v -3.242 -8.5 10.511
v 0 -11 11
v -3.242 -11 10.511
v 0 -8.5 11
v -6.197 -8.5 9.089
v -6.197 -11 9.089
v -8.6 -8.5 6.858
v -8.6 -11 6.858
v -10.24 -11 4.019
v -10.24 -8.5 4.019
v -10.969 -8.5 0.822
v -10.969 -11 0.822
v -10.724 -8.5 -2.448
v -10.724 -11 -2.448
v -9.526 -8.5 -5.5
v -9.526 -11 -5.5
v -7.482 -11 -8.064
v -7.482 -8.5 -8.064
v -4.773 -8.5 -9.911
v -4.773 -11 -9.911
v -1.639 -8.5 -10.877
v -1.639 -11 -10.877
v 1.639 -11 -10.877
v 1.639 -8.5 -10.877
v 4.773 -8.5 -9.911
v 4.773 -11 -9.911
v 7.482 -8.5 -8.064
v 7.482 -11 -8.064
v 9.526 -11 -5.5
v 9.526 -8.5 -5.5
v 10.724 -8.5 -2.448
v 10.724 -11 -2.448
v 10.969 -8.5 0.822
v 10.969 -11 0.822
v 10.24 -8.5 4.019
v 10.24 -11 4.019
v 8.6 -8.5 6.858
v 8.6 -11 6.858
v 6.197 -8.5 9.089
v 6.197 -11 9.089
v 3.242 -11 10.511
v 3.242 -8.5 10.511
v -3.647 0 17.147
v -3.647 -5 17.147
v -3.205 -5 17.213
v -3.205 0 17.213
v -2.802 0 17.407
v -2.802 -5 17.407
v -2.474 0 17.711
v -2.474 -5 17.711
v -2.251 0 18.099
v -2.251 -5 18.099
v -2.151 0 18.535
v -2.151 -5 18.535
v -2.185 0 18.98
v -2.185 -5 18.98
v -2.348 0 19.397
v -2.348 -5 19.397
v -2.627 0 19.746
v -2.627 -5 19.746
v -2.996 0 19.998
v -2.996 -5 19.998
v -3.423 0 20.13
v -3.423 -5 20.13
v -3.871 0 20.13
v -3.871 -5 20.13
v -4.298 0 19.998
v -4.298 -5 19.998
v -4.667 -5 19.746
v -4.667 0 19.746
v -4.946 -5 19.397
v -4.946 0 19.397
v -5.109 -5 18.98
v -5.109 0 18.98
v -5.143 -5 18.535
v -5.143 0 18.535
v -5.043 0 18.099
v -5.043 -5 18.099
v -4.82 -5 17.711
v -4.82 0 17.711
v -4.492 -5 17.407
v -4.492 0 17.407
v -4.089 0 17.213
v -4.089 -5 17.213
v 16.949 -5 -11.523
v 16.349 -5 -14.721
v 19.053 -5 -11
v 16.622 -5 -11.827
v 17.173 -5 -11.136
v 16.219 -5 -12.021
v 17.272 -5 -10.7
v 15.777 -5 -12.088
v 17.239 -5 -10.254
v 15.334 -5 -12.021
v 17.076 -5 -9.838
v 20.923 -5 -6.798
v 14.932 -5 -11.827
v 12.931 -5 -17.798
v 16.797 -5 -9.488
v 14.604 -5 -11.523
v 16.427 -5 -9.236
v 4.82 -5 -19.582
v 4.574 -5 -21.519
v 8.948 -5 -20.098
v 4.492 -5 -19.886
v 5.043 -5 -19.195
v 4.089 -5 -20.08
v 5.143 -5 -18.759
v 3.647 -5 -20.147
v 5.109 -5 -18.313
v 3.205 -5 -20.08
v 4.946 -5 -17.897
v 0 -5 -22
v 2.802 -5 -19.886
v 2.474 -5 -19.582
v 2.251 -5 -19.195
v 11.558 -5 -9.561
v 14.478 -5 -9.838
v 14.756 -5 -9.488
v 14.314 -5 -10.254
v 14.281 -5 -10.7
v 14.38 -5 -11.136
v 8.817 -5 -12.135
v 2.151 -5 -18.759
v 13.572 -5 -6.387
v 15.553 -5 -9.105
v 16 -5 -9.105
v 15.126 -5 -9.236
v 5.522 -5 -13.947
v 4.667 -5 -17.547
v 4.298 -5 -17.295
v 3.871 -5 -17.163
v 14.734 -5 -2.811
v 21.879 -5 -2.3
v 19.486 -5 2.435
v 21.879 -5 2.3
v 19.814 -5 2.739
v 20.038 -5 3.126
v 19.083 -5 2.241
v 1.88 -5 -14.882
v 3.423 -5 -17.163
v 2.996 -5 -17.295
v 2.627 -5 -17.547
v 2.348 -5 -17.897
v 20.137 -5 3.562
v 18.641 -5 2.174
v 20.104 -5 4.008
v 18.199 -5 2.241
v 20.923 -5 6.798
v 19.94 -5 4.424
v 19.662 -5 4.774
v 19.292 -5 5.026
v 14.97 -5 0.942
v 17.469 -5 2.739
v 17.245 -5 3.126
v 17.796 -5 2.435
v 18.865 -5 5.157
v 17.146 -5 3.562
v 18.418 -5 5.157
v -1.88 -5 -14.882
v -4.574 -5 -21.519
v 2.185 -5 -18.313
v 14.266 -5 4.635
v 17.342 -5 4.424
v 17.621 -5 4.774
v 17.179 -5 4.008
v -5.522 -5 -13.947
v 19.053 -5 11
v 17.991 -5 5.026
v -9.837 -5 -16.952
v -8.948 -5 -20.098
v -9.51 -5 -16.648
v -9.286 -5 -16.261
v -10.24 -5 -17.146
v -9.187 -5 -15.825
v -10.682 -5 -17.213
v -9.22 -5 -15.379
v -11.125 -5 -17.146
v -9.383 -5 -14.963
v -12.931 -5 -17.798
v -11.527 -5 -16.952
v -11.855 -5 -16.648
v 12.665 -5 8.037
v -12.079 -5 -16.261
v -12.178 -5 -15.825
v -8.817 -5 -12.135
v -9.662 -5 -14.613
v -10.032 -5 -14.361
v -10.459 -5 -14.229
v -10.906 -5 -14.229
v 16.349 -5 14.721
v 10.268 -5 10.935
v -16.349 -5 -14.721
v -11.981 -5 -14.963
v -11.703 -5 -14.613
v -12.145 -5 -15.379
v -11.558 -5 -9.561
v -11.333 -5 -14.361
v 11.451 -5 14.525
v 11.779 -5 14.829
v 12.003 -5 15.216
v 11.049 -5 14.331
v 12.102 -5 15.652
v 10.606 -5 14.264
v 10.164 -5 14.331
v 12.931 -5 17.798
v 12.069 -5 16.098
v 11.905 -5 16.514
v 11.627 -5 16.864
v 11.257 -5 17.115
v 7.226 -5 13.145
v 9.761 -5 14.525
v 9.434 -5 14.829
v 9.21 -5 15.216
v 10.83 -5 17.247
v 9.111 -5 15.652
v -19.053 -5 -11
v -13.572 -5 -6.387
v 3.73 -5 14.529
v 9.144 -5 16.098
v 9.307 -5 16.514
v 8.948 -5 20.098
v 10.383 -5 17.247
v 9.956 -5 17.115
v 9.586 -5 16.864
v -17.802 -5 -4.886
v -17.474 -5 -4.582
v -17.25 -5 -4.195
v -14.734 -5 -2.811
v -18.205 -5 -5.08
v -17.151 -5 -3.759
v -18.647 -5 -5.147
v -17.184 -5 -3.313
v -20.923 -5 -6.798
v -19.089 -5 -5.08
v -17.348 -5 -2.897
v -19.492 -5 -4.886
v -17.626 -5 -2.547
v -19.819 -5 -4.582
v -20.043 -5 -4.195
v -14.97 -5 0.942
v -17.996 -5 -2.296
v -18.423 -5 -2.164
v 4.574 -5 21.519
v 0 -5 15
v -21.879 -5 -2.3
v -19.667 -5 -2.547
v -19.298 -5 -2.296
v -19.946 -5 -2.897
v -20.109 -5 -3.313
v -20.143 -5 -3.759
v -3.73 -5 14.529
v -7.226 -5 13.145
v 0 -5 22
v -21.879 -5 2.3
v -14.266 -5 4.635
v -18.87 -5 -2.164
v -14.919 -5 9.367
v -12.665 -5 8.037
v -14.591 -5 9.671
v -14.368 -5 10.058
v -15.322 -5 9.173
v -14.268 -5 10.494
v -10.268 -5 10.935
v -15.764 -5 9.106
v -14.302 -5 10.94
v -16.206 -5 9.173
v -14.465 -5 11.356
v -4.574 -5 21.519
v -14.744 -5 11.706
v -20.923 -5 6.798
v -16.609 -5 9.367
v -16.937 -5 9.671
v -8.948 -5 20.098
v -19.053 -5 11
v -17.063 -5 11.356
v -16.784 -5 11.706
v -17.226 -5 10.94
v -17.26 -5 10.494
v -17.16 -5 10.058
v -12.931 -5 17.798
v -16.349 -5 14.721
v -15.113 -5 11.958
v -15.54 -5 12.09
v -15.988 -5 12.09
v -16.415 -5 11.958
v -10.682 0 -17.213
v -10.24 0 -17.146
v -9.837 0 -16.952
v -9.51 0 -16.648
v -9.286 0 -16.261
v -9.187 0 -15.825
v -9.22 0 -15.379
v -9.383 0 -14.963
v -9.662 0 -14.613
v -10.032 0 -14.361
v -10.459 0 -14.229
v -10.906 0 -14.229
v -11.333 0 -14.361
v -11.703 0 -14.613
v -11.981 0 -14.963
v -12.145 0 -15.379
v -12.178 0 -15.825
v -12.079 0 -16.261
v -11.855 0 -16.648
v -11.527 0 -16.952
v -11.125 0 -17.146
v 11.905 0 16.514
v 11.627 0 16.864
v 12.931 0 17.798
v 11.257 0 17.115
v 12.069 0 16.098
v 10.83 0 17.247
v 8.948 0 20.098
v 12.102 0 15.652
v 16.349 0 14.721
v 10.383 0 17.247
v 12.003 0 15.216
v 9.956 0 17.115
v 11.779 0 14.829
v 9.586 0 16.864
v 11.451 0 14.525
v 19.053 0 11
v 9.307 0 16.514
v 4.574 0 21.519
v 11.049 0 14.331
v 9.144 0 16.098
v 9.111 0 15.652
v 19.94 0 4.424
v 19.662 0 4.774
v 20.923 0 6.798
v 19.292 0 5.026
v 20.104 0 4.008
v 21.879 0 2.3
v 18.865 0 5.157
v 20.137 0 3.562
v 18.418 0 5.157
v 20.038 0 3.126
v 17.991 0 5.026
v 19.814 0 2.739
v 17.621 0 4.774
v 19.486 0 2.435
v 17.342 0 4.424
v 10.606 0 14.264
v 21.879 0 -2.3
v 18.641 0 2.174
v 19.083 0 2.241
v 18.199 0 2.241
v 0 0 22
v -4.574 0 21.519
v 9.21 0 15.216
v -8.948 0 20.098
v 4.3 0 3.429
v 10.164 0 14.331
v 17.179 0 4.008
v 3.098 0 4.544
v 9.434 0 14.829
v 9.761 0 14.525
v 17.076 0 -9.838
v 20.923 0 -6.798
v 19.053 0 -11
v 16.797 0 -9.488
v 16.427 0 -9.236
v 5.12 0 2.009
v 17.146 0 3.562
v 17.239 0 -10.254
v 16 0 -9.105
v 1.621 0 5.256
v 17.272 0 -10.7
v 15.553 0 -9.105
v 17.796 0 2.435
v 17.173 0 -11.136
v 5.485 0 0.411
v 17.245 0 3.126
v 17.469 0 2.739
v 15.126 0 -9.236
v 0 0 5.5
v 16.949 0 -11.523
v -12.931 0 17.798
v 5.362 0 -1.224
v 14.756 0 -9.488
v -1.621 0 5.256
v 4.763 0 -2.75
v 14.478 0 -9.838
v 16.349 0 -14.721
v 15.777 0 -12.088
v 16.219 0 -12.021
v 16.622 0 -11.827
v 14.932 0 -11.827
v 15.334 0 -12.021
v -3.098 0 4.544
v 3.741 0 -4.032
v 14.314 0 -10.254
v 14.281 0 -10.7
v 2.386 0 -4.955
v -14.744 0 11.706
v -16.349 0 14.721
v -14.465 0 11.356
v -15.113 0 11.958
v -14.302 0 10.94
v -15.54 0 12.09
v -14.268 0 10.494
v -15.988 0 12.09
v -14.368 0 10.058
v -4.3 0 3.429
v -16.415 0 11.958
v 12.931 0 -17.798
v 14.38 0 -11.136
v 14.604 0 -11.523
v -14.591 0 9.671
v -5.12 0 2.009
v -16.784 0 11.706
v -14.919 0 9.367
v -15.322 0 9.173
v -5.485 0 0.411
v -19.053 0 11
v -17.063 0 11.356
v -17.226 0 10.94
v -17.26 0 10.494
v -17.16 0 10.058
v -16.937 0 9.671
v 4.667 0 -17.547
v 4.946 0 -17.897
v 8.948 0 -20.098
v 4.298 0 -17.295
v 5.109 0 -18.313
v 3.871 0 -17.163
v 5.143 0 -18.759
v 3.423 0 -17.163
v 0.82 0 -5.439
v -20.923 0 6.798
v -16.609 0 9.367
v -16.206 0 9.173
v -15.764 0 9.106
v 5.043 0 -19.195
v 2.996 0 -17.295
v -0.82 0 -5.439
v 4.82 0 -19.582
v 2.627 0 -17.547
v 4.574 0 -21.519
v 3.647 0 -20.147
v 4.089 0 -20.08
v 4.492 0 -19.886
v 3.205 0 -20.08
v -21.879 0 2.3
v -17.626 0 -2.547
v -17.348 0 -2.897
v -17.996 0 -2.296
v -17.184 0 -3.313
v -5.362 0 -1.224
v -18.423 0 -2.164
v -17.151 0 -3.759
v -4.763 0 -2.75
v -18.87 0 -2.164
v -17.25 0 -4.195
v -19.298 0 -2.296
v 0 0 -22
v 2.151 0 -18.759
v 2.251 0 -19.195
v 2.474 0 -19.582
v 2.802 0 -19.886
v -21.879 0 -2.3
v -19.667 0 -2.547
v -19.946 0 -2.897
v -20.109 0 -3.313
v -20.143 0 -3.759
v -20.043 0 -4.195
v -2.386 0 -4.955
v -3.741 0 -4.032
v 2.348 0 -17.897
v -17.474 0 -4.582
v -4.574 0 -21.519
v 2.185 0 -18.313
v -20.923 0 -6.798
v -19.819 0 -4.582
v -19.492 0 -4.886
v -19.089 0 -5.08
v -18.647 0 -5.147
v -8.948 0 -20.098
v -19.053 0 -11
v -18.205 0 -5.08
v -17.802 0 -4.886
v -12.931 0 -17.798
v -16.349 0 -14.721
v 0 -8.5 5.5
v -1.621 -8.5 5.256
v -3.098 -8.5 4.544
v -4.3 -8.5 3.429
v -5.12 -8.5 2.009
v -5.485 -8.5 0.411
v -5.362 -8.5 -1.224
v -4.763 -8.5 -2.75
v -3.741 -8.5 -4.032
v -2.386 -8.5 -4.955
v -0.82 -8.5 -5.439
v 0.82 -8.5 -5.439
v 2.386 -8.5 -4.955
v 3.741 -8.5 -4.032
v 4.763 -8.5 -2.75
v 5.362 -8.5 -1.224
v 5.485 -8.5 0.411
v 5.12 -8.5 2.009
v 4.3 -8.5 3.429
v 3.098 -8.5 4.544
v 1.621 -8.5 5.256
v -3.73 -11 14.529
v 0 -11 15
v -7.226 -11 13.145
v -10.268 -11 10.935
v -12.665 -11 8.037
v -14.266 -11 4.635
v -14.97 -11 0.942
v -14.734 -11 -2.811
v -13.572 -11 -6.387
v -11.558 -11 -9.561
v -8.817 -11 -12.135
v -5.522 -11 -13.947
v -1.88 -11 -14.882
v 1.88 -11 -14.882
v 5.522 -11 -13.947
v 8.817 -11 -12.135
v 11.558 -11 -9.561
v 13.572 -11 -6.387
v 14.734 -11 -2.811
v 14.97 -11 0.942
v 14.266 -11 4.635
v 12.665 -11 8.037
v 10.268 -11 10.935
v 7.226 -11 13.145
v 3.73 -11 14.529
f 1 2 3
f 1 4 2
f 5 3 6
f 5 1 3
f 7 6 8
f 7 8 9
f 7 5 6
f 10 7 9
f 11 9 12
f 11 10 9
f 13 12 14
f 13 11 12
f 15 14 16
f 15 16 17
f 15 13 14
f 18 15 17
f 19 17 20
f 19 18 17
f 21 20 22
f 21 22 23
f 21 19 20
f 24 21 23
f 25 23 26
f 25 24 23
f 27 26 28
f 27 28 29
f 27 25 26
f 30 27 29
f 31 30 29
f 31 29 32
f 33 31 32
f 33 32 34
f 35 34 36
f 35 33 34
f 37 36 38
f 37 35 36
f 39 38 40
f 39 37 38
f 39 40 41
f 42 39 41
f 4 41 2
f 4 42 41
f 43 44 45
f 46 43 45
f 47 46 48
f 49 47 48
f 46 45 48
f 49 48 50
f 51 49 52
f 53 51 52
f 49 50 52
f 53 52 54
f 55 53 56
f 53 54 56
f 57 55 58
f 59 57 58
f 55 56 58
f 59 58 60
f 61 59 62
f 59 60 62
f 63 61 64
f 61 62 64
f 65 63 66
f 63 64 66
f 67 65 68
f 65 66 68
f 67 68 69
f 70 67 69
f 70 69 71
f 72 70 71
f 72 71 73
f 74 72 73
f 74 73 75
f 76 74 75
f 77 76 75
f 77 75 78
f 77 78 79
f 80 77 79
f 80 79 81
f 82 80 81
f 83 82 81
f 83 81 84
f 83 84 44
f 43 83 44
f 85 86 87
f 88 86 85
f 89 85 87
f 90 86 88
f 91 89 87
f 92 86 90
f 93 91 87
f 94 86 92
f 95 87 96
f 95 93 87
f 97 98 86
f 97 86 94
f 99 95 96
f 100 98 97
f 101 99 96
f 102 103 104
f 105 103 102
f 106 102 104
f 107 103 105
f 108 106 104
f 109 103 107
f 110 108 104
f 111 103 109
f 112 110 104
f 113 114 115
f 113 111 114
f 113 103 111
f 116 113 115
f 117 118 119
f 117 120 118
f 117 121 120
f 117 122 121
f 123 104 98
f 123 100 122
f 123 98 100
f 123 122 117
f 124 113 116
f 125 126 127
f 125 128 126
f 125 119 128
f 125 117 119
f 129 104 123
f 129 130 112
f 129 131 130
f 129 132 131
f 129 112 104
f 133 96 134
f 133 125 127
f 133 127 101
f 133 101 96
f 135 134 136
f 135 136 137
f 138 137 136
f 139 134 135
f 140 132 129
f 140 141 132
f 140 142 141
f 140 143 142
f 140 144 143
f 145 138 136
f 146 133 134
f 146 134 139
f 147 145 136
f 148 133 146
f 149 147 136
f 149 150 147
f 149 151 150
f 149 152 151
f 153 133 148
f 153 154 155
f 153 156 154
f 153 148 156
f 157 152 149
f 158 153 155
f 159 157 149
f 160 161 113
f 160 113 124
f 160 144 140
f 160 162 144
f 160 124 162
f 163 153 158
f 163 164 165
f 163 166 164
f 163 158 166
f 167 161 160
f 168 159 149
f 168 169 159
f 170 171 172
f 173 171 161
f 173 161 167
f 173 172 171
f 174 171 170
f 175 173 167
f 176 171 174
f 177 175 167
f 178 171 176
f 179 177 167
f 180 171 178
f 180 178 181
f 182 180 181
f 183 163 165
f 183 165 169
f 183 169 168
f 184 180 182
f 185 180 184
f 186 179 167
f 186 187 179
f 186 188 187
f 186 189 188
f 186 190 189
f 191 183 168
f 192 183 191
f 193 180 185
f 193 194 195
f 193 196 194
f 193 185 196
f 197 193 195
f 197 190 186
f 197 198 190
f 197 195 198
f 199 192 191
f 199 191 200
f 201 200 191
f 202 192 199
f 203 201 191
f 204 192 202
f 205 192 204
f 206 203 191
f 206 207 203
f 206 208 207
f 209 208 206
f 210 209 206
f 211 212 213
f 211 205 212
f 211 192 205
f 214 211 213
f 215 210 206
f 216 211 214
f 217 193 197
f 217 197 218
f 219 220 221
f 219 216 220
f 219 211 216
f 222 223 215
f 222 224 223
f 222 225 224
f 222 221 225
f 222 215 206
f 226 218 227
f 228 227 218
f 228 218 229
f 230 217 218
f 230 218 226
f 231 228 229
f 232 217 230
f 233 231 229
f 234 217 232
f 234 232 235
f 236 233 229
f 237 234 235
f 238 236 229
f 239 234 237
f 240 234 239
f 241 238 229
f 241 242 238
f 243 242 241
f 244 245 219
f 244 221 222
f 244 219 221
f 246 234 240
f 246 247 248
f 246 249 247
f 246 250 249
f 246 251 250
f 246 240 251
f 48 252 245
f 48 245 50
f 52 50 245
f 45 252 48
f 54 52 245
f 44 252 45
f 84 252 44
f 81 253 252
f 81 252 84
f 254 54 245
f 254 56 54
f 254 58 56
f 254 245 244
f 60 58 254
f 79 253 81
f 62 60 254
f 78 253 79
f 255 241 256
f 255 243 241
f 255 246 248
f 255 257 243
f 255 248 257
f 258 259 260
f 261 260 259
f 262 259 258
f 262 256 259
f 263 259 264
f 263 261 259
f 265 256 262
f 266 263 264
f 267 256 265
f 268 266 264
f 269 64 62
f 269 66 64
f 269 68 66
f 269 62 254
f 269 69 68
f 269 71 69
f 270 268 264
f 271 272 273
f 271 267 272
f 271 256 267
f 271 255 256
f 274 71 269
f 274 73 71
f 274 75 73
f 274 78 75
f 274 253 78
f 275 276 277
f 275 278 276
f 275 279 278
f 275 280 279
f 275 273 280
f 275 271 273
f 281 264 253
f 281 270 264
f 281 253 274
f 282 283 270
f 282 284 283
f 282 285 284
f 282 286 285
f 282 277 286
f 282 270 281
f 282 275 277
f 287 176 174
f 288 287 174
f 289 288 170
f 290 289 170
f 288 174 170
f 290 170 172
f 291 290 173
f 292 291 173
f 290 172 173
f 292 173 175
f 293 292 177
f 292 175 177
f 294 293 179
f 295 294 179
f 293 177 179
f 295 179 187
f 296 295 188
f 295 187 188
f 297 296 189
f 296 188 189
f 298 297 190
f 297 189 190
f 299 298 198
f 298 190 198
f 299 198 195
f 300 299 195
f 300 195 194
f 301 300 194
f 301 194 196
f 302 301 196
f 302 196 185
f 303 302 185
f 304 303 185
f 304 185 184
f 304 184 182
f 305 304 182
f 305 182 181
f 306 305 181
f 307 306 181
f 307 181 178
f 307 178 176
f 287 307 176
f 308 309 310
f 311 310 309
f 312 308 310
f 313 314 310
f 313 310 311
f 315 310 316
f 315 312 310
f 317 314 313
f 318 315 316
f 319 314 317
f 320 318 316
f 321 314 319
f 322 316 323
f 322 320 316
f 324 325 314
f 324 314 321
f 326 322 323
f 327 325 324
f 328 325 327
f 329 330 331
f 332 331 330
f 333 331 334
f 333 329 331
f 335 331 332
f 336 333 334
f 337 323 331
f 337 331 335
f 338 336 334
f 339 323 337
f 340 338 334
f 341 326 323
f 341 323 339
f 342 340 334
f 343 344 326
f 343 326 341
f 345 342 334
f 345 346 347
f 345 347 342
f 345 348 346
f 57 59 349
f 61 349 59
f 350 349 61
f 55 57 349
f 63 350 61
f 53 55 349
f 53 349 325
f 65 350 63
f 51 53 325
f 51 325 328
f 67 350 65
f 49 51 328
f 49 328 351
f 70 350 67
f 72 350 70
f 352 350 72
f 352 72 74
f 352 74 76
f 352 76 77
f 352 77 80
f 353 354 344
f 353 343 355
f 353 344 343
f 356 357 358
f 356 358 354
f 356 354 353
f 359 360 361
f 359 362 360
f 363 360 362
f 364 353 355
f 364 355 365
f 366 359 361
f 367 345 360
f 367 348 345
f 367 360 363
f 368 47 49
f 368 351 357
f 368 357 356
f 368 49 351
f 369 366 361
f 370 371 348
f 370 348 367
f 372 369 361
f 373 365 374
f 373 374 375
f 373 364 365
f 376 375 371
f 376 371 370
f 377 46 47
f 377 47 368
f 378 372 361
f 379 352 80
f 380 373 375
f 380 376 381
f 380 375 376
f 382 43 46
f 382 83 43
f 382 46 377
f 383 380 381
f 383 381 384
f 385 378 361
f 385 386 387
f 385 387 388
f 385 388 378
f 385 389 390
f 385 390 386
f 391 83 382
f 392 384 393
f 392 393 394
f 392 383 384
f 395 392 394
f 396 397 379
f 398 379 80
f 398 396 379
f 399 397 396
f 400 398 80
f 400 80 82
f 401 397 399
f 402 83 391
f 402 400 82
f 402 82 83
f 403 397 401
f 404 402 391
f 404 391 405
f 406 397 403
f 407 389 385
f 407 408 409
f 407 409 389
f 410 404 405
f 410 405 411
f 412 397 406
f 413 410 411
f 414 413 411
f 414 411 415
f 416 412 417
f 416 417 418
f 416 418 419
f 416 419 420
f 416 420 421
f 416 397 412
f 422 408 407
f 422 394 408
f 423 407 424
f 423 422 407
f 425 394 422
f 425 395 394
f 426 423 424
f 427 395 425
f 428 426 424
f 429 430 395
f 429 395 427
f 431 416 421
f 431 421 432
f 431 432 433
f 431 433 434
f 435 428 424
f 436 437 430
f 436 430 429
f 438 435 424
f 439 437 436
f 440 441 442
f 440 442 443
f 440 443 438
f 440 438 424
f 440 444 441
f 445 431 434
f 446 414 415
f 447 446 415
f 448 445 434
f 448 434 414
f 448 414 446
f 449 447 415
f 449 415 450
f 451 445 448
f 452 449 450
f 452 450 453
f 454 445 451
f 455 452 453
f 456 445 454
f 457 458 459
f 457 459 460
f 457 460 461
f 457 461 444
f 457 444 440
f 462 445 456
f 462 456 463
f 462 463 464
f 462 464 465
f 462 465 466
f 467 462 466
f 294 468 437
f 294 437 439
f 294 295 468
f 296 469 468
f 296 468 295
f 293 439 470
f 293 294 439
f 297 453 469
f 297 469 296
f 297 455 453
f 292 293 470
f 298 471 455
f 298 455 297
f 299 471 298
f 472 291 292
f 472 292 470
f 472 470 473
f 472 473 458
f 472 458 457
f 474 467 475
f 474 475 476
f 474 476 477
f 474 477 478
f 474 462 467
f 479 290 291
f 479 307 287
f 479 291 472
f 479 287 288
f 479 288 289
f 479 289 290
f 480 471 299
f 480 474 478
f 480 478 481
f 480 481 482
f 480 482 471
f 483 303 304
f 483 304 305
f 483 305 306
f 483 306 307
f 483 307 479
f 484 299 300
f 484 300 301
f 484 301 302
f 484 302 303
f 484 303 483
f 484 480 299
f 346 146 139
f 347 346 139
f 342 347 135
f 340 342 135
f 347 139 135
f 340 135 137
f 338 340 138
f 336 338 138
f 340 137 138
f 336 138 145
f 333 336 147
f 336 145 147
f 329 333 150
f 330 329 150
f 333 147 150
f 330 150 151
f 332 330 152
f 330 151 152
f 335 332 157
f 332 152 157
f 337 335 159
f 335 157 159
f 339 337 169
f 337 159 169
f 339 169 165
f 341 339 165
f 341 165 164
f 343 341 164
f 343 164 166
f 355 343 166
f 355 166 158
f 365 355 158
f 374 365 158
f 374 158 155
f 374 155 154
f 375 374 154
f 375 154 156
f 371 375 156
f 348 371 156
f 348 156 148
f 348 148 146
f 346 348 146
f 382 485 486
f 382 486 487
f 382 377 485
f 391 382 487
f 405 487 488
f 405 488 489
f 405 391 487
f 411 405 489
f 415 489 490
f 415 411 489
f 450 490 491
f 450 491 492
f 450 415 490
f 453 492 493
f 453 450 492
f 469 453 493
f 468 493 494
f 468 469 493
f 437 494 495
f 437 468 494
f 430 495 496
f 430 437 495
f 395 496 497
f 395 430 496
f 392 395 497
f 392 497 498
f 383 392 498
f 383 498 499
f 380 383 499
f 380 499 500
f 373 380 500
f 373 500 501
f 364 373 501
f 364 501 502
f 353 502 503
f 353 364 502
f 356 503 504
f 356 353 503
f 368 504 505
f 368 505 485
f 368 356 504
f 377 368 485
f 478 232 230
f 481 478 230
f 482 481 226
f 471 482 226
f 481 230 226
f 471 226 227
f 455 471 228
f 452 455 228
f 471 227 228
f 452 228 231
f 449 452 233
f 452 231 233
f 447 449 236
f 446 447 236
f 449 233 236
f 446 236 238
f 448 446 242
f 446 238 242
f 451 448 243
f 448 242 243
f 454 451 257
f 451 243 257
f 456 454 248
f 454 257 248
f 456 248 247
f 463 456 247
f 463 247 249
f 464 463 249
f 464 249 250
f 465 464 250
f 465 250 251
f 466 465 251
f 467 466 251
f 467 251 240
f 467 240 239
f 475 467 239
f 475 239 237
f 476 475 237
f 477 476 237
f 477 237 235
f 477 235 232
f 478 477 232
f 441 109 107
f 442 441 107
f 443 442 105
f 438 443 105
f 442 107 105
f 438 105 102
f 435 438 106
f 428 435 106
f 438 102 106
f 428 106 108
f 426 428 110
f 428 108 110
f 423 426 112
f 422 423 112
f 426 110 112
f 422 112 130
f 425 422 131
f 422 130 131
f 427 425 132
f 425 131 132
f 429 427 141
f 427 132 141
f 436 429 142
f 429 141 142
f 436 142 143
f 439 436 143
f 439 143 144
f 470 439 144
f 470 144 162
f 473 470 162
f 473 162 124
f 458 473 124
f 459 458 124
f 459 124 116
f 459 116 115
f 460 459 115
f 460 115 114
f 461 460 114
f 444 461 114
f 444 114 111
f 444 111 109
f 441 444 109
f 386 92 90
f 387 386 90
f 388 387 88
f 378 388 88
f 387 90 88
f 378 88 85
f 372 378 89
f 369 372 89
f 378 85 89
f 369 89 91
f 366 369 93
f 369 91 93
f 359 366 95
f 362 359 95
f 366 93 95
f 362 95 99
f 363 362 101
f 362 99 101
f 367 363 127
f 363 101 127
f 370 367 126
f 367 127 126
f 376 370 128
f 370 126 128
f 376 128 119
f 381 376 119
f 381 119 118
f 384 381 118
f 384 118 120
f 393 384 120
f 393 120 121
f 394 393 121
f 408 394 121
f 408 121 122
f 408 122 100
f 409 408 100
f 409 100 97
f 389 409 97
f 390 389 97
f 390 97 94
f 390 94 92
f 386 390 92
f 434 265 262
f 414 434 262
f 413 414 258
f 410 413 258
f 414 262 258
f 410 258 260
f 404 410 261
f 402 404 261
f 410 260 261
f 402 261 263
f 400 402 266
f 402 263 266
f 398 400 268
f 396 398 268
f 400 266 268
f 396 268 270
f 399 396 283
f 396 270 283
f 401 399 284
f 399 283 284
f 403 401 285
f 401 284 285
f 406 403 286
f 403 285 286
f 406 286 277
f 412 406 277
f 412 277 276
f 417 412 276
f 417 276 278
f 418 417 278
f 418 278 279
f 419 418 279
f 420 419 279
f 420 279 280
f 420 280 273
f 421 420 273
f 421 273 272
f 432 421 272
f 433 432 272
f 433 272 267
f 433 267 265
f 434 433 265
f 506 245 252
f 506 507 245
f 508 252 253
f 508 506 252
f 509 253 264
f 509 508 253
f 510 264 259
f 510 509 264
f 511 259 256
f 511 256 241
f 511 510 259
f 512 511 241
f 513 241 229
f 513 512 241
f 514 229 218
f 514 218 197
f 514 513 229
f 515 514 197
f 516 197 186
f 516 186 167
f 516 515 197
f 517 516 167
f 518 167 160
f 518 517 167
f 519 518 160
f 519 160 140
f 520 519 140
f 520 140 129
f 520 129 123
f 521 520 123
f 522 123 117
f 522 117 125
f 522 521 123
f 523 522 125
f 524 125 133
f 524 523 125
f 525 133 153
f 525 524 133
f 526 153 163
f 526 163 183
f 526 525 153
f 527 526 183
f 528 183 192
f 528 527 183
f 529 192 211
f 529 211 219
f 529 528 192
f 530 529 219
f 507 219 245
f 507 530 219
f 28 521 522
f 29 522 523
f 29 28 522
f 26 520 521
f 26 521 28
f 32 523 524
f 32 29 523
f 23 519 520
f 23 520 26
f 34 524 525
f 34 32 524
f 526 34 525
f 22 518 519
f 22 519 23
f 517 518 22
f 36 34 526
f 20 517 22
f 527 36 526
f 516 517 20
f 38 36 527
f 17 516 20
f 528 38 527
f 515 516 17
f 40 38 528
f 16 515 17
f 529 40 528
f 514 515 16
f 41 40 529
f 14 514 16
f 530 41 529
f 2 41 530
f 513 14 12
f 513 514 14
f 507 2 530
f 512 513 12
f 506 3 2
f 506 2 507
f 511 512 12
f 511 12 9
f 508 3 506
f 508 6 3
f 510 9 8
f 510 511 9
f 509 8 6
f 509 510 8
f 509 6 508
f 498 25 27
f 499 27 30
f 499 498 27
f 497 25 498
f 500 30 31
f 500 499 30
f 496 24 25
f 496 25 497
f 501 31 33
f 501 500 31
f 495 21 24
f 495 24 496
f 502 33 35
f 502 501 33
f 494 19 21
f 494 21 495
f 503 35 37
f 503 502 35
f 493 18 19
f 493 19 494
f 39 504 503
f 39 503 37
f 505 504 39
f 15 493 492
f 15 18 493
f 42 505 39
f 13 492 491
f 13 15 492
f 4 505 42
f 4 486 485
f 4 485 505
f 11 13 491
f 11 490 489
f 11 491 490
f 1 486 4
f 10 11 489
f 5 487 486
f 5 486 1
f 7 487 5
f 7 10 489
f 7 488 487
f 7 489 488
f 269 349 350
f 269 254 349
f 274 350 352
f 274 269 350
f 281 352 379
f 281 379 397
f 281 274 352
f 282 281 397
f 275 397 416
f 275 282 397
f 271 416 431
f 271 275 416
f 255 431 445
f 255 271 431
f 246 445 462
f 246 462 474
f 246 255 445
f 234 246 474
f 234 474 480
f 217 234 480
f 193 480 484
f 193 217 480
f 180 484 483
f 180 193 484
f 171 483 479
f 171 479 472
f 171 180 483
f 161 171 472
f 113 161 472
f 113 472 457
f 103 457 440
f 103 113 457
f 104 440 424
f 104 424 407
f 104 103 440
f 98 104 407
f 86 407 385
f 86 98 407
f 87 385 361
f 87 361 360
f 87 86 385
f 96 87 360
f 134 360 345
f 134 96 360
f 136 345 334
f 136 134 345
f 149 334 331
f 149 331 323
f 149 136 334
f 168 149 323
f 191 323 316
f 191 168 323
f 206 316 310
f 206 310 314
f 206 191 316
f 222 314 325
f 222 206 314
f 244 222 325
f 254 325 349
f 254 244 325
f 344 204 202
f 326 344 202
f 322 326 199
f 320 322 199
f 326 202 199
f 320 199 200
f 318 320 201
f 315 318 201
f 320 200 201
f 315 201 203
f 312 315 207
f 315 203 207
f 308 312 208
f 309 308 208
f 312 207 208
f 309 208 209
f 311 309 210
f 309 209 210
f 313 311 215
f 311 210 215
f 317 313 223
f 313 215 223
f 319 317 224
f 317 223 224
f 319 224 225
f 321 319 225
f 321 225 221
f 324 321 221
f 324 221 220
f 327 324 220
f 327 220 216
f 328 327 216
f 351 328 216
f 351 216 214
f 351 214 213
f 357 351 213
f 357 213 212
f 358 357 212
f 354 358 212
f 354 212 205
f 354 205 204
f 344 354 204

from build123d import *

# Parameters (mm, degrees)
DIAM_TRE_DU_PER_AGE_3_0_3_1_D = 3


with BuildPart() as part:
    # Esquisse1 → Révolution1 (revolve)
    with BuildSketch(Plane.XY):
        Polygon((-5.5, 0), (-22, 0), (-22, -5), (-15, -5), (-15, -11), (-11, -11), (-11, -8.5), (-5.5, -8.5), align=None)
    revolve(axis=Axis((0, 41.470120614, 0), (0, -1, 0)))

    # Diamètre du perçage Ø3.0 (3)1 (through all)
    with Locations(Plane(origin=(3.647024388, 0, -18.646694429), x_dir=(0, 0, 1), z_dir=(0, 1, 0))):
        with Locations((0, 0), (8.05893299, 12.12951857), (22.320944817, 14.994324385), (2.934102993, -14.329461861), (14.999670041, -22.293718817), (29.25306283, -19.411064141), (37.293388858, -7.294048776), (34.410734182, 6.959344013)):
            Hole(DIAM_TRE_DU_PER_AGE_3_0_3_1_D / 2)


solid = part.part
